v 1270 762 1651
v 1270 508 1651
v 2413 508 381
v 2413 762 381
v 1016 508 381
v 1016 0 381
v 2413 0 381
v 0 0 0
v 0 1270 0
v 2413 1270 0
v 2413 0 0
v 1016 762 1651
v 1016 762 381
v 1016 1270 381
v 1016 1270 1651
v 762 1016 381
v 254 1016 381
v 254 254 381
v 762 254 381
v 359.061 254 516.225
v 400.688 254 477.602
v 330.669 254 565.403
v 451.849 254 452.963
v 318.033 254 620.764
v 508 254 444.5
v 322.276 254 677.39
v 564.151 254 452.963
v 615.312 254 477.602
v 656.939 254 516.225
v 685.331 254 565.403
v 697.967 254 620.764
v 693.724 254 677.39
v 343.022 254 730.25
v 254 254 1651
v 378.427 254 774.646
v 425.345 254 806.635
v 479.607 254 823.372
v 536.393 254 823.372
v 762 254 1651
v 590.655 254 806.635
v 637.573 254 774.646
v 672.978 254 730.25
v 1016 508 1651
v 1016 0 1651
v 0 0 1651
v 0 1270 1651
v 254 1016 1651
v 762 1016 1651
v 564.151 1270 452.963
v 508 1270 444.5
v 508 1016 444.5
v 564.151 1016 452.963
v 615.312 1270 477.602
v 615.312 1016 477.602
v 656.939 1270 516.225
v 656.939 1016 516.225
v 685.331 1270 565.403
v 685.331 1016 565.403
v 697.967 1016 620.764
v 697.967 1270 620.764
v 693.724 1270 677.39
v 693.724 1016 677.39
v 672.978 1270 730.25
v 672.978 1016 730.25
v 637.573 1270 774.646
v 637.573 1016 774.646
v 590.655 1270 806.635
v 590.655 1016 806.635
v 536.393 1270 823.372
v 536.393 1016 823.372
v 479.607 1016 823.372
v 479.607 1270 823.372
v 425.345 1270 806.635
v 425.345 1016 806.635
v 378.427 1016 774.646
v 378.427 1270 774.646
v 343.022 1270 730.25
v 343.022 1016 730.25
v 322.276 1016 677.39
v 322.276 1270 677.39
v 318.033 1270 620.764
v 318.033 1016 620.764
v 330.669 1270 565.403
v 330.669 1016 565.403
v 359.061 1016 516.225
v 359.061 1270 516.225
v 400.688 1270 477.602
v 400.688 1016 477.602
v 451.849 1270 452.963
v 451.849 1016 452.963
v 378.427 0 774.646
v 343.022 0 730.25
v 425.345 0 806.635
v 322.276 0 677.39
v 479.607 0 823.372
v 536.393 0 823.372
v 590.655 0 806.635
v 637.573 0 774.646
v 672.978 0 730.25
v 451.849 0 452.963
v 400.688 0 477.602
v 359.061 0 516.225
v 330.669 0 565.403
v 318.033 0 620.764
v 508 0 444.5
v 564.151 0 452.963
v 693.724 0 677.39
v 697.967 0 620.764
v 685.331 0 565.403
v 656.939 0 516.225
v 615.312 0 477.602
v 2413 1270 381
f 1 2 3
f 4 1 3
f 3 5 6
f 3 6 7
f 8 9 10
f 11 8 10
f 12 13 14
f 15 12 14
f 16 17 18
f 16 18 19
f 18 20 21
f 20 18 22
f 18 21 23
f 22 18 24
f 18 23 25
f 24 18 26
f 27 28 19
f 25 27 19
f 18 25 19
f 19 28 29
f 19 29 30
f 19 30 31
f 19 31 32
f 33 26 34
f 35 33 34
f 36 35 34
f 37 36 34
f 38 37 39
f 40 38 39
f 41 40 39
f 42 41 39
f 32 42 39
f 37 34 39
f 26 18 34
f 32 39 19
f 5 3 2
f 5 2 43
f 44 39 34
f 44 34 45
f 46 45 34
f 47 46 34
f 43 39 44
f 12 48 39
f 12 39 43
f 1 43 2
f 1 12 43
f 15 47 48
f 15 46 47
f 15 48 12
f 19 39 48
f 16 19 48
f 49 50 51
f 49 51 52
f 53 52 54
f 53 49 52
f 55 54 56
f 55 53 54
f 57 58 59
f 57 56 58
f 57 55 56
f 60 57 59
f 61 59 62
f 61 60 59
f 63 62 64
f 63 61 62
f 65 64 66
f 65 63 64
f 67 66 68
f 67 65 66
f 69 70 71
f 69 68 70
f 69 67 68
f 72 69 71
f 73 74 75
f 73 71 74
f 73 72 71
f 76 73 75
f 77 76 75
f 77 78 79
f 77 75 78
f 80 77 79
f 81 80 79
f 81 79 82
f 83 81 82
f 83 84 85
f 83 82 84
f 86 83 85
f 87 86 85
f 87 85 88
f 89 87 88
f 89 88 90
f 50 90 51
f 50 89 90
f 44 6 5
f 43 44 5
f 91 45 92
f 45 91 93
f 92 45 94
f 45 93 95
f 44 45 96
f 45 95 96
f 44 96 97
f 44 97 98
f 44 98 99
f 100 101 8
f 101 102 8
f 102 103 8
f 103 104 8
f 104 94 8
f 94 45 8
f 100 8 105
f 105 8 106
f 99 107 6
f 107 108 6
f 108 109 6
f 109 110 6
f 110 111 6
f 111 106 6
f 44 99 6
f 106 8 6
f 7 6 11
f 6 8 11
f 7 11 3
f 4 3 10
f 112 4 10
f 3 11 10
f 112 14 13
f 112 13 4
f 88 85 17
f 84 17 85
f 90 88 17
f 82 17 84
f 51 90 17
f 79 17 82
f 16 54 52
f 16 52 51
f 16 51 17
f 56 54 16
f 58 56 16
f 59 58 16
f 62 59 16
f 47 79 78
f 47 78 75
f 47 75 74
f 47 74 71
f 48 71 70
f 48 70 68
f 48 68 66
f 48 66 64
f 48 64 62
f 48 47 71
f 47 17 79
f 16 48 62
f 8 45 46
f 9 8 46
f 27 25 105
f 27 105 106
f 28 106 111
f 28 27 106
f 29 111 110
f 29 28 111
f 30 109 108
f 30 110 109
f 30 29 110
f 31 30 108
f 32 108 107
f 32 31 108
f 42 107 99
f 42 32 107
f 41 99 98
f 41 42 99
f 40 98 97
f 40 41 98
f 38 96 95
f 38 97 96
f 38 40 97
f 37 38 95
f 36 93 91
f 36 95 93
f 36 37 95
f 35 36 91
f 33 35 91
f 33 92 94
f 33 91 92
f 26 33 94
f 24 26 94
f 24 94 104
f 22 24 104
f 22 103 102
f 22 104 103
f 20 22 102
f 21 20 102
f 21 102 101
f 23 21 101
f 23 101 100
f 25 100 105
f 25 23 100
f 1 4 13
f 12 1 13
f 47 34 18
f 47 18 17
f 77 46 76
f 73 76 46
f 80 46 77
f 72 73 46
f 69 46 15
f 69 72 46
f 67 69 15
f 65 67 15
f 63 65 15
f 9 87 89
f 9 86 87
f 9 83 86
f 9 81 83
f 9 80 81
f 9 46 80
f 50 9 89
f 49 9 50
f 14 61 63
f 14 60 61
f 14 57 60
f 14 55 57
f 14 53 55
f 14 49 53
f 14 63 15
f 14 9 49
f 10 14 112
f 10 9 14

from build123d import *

# Parameters (mm, degrees)
SKETCH1_W               = 2413
SKETCH1_H               = 1270
BOSS_EXTRUDE1_DEPTH     = 381
SKETCH2_W               = 1016
SKETCH2_H               = 1270
BOSS_EXTRUDE2_DEPTH     = 1270
SKETCH3_W               = 508
SKETCH3_H               = 762
CUT_EXTRUDE1_DEPTH      = 1270
SKETCH5_W               = 254
SKETCH5_H               = 254
BOSS_EXTRUDE3_DEPTH     = 1270
BOSS_EXTRUDE4_DEPTH     = 254
CUT_EXTRUDE2_DEPTH      = 3188.674701095
CUT_EXTRUDE2_DEPTH_BACK = 3188.674701095
SKETCH8_R               = 190.5


with BuildPart() as part:
    # Sketch1 → Boss-Extrude1 (new body)
    with BuildSketch(Plane.XY):
        with Locations((1206.5, 635)):
            Rectangle(SKETCH1_W, SKETCH1_H)
    extrude(amount=BOSS_EXTRUDE1_DEPTH)

    # Sketch2 → Boss-Extrude2 (add)
    with BuildSketch(Plane.XY.offset(381)):
        with Locations((508, 635)):
            Rectangle(SKETCH2_W, SKETCH2_H)
    extrude(amount=BOSS_EXTRUDE2_DEPTH)

    # Sketch3 → Cut-Extrude1 (cut)
    with BuildSketch(Plane.XY.offset(1651)):
        with Locations((508, 635)):
            Rectangle(SKETCH3_W, SKETCH3_H)
    extrude(amount=-CUT_EXTRUDE1_DEPTH, mode=Mode.SUBTRACT)

    # Sketch5 → Boss-Extrude3 (add)
    with BuildSketch(Plane.XY.offset(1651)):
        with Locations((1143, 635)):
            Rectangle(SKETCH5_W, SKETCH5_H)
    extrude(amount=-BOSS_EXTRUDE3_DEPTH)

    # Sketch7 → Boss-Extrude4 (add)
    with BuildSketch(Plane.XZ.offset(-508)):
        Polygon((1270, 1651), (2413, 381), (1270, 381), align=None)
    extrude(amount=-BOSS_EXTRUDE4_DEPTH)

    # Sketch8 → Cut-Extrude2 (cut, two sides: drawn at the far end of the back side and taken through both)
    with BuildSketch(Plane.XZ.offset(-CUT_EXTRUDE2_DEPTH_BACK)):
        with Locations(Location((508, 635, 0), (0, 0, 270))):
            Circle(SKETCH8_R)
    extrude(amount=CUT_EXTRUDE2_DEPTH + CUT_EXTRUDE2_DEPTH_BACK, mode=Mode.SUBTRACT)


solid = part.part
